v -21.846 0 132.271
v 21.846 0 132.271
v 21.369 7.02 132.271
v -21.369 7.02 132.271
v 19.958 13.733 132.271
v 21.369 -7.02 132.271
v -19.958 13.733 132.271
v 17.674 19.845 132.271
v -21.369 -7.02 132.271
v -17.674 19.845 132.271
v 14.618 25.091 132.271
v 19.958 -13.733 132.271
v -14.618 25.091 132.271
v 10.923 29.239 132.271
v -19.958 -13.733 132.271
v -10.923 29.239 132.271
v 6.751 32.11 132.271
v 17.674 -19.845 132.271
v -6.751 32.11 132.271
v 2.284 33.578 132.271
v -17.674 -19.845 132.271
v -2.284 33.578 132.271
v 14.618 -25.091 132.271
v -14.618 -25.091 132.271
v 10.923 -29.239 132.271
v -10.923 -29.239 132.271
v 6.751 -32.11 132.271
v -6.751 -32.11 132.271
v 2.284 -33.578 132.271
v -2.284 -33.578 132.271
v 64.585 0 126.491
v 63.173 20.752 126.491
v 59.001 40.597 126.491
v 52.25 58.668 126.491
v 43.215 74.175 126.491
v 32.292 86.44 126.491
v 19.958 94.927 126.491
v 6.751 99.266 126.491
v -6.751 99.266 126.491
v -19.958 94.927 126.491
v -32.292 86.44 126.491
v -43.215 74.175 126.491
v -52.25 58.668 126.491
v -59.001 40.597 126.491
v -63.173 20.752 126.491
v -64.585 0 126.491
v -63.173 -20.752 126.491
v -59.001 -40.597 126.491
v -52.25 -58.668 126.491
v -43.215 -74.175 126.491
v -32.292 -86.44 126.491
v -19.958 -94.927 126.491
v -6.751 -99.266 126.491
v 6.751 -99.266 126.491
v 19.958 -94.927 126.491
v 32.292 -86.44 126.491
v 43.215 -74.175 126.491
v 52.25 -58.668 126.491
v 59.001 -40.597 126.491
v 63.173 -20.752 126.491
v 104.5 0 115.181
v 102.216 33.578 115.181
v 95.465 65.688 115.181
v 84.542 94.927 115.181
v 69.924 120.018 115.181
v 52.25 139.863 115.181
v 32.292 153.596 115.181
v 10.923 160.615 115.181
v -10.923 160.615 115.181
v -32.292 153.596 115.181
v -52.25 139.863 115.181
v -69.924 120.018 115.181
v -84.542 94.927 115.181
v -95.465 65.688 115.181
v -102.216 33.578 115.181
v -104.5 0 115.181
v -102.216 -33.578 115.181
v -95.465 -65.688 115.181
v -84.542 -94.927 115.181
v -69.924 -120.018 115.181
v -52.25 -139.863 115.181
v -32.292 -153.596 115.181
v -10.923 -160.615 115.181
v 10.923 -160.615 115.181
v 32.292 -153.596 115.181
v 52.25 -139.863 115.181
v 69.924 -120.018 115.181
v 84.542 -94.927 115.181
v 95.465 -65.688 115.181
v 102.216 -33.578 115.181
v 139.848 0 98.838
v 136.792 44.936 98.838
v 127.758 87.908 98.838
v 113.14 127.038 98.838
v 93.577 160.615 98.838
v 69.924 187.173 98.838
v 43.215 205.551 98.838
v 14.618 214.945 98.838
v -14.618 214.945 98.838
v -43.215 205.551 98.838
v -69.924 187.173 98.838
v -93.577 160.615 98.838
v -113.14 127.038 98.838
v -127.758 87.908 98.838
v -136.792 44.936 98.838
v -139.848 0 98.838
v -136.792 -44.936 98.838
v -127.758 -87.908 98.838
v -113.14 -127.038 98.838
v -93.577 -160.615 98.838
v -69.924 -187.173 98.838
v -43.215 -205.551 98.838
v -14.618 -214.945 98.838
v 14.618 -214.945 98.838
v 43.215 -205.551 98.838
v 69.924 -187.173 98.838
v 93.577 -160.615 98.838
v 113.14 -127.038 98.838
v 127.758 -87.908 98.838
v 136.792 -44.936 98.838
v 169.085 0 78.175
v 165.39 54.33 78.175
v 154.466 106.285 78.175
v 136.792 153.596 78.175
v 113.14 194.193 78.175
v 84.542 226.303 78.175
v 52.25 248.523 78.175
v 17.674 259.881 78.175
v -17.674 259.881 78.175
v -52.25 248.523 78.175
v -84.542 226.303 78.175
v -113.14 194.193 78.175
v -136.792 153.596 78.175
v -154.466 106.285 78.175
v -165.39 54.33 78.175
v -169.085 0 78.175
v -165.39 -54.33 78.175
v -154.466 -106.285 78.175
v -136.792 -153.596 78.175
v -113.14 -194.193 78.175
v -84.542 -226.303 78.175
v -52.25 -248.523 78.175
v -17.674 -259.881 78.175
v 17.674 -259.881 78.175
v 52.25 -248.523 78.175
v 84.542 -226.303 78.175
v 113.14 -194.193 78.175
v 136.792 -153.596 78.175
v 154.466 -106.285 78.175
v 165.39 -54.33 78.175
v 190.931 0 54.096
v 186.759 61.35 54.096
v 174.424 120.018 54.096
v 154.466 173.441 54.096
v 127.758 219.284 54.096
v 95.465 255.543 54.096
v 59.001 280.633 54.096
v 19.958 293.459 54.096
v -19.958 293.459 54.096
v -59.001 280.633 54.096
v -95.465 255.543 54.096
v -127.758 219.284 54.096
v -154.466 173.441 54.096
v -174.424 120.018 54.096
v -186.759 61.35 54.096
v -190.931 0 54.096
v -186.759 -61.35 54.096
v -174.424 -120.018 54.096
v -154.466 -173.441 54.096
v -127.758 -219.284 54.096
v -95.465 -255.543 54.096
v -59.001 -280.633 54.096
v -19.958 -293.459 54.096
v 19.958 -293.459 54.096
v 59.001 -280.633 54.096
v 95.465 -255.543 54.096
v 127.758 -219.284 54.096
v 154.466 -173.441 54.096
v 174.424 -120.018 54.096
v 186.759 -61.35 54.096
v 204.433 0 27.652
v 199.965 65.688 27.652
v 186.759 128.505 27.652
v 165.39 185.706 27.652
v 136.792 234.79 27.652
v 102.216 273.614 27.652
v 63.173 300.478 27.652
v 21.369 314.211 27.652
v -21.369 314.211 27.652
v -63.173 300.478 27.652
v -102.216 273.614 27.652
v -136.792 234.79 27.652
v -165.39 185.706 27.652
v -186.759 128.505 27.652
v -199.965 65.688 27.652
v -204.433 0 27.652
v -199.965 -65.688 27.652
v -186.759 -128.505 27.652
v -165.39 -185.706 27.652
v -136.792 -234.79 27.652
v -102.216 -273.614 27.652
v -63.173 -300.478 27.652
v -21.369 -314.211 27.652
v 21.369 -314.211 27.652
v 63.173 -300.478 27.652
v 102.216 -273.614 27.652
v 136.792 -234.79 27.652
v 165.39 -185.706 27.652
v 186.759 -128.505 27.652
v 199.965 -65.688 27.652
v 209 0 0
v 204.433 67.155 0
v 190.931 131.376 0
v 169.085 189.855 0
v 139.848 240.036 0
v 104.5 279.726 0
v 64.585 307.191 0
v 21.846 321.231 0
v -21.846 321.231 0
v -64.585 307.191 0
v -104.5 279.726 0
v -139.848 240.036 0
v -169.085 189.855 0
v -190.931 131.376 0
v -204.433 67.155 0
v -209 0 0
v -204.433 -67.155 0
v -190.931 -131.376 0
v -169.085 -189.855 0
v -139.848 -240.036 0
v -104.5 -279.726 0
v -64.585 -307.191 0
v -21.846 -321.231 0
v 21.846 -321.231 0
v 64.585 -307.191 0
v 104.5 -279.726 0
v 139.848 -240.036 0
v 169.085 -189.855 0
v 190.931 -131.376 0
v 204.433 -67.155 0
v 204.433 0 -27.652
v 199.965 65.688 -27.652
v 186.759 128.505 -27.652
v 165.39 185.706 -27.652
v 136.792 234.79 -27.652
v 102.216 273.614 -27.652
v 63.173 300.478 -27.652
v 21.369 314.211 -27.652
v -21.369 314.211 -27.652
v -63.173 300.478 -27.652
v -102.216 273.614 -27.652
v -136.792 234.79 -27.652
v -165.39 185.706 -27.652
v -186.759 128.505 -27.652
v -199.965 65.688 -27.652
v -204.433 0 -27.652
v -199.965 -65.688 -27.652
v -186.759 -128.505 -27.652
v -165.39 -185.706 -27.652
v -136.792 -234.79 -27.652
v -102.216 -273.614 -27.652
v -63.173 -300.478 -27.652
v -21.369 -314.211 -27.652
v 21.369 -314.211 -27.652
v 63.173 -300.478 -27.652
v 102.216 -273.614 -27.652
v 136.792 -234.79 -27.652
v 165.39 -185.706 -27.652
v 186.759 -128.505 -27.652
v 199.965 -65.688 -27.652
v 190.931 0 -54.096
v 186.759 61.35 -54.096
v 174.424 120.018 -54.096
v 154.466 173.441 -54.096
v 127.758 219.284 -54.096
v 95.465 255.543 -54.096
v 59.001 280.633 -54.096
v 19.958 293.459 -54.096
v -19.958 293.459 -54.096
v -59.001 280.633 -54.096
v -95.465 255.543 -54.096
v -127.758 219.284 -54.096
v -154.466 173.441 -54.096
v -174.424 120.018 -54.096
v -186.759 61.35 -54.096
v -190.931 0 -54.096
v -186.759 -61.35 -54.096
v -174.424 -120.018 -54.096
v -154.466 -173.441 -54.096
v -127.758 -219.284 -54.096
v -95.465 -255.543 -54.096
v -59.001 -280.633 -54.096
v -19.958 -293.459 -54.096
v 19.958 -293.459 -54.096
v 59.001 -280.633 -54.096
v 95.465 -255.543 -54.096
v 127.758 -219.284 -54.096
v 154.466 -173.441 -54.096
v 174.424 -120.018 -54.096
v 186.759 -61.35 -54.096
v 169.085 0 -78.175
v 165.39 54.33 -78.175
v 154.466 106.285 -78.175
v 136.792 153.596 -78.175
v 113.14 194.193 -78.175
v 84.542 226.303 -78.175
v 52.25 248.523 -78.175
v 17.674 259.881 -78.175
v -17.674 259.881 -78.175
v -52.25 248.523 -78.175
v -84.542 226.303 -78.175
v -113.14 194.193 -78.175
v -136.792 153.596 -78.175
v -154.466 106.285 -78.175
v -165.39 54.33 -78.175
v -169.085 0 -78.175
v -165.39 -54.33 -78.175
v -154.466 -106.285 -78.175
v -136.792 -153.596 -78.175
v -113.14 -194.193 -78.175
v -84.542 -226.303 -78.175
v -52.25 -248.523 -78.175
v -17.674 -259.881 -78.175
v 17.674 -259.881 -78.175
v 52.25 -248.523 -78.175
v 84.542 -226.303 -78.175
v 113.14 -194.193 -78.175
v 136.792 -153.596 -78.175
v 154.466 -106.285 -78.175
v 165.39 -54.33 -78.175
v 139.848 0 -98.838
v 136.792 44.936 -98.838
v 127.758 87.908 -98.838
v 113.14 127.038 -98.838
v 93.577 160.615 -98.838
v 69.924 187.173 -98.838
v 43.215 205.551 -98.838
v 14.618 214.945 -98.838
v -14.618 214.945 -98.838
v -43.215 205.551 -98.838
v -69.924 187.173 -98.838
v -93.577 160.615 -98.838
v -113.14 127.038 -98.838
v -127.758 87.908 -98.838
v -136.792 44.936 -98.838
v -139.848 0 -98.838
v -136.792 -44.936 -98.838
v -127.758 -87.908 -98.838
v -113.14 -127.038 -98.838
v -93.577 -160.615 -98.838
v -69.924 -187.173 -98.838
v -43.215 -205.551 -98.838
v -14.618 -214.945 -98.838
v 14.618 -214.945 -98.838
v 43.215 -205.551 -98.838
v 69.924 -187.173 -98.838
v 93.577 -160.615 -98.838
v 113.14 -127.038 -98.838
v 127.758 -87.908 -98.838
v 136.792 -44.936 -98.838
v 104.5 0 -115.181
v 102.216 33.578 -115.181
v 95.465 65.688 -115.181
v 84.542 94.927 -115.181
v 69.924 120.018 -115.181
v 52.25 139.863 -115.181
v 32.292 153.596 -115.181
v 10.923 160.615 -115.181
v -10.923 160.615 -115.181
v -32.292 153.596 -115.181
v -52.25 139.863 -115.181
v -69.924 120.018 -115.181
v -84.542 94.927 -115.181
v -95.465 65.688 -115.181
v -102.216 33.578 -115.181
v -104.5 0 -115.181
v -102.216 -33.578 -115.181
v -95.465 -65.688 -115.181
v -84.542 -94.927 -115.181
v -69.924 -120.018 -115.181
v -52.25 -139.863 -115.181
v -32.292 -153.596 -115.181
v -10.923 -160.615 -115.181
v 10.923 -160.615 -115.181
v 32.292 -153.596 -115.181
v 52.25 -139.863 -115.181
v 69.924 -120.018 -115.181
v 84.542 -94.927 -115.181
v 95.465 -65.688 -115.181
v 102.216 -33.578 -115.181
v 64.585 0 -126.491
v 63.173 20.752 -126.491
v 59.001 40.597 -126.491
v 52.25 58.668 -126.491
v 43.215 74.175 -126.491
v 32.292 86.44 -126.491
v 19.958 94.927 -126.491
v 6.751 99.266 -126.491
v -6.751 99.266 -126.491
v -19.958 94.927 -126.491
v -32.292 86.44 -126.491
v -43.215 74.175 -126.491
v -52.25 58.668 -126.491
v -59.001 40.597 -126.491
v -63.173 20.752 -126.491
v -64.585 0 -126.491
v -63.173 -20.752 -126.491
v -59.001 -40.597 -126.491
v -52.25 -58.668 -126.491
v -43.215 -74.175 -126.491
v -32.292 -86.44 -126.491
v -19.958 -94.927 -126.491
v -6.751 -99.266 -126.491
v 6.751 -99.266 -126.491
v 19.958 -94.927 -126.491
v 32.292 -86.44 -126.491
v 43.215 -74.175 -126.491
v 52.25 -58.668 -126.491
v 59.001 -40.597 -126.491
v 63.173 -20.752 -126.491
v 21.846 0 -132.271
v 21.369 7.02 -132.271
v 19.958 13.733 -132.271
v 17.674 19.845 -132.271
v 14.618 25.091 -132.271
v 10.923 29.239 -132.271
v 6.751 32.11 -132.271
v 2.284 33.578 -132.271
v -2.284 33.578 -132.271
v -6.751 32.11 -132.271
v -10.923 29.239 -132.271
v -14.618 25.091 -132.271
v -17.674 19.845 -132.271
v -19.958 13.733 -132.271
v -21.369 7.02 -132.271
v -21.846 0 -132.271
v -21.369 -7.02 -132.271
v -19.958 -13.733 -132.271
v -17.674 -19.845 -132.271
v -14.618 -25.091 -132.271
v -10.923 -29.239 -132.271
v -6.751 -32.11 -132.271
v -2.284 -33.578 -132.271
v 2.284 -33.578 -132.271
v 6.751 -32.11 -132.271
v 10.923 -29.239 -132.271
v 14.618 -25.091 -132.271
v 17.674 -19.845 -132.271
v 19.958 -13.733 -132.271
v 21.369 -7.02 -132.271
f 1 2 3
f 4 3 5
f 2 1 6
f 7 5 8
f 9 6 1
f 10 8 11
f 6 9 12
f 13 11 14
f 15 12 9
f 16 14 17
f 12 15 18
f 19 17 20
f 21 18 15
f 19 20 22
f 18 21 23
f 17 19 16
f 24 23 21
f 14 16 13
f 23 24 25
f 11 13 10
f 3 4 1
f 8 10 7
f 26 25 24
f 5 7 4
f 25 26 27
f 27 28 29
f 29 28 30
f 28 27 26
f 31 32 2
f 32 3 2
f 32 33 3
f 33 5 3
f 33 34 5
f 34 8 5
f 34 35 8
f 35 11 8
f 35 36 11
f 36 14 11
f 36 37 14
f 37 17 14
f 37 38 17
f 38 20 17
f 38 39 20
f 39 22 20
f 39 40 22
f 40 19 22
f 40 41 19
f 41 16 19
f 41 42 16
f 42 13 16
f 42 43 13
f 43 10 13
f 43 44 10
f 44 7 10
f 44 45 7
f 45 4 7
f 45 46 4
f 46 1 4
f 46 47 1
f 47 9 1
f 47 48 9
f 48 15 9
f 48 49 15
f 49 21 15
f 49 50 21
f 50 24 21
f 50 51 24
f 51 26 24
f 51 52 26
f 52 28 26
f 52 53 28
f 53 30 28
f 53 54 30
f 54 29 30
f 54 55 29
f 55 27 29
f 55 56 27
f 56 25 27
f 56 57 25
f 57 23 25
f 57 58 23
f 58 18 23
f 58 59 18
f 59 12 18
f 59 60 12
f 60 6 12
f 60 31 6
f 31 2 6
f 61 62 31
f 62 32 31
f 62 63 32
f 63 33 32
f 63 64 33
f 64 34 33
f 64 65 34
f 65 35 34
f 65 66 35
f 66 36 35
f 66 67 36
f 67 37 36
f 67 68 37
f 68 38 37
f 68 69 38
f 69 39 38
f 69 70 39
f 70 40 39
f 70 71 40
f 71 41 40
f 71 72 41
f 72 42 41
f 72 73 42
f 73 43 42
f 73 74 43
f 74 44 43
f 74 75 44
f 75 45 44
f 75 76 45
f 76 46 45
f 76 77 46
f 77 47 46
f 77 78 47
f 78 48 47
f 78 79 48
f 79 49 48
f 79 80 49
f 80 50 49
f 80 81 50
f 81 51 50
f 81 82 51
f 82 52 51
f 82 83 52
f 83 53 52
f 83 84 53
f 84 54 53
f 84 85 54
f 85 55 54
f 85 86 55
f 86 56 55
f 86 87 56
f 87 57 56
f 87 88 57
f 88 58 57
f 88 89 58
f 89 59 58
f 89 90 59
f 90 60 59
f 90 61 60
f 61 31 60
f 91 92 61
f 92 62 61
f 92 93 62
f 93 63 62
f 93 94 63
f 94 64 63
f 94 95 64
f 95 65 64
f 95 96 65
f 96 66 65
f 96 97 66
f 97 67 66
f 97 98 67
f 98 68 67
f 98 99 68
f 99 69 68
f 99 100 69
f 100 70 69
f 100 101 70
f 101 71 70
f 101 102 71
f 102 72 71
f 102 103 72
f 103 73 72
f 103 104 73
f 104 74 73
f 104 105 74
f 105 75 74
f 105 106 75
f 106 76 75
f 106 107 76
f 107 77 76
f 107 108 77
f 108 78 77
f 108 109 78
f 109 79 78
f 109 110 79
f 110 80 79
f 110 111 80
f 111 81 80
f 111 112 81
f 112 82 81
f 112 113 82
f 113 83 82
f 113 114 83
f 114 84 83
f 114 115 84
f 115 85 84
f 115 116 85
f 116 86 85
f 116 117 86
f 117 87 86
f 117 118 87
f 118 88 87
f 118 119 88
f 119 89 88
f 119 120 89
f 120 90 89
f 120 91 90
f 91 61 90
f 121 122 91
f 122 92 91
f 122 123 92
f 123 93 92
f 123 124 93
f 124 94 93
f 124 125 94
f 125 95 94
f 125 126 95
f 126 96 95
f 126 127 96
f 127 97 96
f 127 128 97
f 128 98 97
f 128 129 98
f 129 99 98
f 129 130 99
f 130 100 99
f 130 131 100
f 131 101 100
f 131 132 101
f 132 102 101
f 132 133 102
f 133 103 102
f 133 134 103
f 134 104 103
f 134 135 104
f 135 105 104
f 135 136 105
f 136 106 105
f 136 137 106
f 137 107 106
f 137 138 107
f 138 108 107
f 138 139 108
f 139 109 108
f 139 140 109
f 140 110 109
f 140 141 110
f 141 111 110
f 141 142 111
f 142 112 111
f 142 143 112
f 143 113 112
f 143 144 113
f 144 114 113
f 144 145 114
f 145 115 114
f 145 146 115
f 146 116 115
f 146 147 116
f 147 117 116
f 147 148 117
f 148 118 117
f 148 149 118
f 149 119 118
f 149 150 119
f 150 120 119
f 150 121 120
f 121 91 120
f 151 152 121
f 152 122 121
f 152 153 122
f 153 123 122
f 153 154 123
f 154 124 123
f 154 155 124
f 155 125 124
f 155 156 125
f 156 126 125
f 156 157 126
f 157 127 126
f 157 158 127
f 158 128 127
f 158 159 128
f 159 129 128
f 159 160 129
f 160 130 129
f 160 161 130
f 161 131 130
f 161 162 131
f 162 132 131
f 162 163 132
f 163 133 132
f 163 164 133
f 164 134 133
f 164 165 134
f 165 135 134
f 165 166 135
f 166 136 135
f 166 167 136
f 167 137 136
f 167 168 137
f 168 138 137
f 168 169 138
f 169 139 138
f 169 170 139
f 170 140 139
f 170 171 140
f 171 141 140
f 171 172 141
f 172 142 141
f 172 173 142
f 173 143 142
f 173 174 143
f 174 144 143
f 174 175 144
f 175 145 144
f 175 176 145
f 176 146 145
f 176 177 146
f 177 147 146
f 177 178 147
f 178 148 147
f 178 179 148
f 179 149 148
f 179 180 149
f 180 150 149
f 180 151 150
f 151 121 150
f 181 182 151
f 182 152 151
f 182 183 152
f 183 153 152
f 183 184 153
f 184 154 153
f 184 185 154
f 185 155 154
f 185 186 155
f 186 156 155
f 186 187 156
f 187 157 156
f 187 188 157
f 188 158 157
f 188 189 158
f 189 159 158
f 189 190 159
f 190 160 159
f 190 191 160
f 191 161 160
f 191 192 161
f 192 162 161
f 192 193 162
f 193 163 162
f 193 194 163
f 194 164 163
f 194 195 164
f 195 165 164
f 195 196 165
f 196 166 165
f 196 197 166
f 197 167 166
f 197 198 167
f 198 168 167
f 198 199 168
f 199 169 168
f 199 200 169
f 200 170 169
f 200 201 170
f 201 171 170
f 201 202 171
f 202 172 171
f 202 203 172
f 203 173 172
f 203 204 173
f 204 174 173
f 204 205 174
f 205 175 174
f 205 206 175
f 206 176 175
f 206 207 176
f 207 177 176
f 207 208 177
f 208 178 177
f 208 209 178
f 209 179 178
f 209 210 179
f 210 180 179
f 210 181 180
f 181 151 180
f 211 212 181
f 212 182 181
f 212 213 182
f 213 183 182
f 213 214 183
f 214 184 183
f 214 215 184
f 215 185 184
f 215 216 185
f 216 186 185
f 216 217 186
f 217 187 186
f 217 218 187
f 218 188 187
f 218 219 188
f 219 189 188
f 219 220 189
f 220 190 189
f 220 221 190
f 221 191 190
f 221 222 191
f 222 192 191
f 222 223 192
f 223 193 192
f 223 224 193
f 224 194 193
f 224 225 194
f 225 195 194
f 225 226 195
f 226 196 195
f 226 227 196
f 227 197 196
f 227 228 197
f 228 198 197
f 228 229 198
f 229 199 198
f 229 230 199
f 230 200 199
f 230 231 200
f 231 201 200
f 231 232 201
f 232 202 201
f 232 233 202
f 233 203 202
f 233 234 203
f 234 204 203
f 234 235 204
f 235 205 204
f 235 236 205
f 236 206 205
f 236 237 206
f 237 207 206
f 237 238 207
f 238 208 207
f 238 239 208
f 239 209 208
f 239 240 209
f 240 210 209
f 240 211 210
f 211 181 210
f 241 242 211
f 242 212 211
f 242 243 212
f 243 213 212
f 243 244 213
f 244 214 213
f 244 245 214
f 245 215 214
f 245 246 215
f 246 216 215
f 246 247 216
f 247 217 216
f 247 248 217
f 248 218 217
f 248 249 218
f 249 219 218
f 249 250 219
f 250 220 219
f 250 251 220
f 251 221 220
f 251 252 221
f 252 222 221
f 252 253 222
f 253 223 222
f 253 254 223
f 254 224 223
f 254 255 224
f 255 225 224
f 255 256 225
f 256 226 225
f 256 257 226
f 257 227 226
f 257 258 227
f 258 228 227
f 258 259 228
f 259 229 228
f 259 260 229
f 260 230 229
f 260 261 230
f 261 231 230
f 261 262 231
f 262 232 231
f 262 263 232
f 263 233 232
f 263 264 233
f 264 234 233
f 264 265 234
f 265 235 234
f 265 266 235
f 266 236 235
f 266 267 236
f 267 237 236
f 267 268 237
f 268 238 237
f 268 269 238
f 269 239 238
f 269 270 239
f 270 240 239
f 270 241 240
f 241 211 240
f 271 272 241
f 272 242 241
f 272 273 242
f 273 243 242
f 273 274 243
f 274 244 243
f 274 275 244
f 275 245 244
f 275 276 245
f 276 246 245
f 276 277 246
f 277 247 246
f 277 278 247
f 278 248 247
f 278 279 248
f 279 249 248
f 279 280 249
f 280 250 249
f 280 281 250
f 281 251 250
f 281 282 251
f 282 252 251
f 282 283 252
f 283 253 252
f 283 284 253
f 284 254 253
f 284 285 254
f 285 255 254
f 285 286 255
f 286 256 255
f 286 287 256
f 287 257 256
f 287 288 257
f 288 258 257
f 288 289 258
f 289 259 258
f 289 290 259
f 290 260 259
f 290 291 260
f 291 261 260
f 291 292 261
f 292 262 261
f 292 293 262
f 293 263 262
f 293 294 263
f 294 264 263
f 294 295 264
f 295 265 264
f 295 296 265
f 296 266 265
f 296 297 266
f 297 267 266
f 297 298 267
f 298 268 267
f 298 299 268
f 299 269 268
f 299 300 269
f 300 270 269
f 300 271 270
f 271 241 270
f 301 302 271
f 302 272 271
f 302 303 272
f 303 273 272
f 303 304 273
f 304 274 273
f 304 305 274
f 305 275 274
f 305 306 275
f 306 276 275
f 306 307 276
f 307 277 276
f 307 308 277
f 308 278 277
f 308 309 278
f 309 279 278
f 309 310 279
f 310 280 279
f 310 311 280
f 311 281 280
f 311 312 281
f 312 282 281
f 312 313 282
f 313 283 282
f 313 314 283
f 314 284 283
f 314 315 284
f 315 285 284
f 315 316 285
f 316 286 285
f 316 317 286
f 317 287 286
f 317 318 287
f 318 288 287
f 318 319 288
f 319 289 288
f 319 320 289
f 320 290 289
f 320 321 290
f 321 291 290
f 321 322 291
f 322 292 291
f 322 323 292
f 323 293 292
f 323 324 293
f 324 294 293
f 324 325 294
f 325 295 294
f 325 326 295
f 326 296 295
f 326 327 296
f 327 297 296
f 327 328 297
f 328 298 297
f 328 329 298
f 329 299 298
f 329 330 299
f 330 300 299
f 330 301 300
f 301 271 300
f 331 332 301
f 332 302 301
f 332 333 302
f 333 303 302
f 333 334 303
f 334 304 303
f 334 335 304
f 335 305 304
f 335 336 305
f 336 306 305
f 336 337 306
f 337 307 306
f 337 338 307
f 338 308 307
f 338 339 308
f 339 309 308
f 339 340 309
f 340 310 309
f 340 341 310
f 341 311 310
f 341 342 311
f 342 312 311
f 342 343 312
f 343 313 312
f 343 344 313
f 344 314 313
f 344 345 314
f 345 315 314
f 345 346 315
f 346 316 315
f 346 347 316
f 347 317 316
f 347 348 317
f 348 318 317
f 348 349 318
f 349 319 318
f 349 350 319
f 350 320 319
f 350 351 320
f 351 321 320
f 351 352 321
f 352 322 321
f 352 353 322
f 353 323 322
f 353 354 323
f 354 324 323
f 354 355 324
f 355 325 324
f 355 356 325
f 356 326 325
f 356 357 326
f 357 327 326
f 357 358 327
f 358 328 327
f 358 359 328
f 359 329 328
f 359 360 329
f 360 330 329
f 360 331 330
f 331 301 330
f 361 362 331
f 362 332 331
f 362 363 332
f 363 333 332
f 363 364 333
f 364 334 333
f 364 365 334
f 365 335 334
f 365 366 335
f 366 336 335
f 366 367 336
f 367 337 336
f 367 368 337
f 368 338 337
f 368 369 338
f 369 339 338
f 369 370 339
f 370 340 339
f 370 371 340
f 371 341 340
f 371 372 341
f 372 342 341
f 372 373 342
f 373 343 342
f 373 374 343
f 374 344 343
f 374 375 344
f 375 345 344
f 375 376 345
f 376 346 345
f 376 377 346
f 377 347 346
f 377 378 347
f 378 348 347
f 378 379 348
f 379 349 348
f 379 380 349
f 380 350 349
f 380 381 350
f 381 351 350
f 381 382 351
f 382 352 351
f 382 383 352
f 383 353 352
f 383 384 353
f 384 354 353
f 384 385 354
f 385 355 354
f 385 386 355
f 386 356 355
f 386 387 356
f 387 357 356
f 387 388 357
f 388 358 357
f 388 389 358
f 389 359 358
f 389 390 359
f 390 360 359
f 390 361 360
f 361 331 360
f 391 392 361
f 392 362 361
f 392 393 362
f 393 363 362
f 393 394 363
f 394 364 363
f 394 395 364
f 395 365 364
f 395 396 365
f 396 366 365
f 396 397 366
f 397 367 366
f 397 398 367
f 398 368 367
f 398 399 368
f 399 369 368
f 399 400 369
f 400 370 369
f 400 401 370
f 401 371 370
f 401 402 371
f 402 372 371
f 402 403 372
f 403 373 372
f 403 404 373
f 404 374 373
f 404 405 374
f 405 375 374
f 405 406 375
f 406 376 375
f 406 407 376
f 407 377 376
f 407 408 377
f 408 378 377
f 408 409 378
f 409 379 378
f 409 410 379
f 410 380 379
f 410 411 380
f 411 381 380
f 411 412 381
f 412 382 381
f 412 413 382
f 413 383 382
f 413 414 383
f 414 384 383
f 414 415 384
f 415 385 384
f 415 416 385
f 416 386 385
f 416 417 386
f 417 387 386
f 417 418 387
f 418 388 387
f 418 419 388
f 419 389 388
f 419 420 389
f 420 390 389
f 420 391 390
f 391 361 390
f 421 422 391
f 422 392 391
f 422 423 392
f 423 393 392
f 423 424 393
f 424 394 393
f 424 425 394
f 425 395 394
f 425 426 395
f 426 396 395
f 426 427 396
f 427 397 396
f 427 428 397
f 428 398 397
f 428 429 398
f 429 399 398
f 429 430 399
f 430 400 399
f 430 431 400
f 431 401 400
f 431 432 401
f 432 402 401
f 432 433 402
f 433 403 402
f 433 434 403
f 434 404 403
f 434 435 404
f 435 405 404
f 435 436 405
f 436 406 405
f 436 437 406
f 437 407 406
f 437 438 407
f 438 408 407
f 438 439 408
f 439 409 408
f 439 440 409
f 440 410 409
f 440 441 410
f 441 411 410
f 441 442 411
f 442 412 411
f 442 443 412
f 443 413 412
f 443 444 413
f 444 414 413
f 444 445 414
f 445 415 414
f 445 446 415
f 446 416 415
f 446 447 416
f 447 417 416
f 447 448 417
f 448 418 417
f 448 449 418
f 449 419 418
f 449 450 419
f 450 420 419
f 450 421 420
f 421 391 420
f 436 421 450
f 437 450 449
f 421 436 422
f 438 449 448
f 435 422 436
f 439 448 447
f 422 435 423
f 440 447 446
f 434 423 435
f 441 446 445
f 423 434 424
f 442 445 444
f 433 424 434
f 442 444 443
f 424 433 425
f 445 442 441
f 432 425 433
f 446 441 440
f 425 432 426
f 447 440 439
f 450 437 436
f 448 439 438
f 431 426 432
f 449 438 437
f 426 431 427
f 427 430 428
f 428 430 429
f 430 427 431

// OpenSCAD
// Generated by SolidPython 1.0.1 on 2020-07-29 00:46:50


scale(v = [11, 17, 7]) {
	sphere(r = 19);
}
/***********************************************
*********      SolidPython code:      **********
************************************************
 
# import packages: SolidPython
from solid import *
from solid.utils import *
from itertools import chain, combinations, permutations


class Resize:

    def __init__(self, scad_file):
        self.scad_file = scad_file
        #self.scad_file = import_scad(scad_file)
        # cone/cylinder param:
        self.r1 = 0
        self.r2 = 0
        self.h = 0
        # rectangular prism param:
        self.w = 0
        self.l = 0
        # ellipse param:
        self.r = 0

    # import OpenScad code (file name corresponds to shape)


    # classify shape + parameters
    def assign(self, param1, param2, param3):
        if self.scad_file == 'cone.scad':
            self.r1 = param1
            self.r2 = param2
            self.h = param3
        elif self.scad_file == 'cylinder.scad':
            self.r1 = param1
            self.r2 = param2
            self.h = param3
        elif self.scad_file == 'rectangularPrism.scad':
            self.h = param1
            self.l = param2
            self.w = param3
        else:
            self.r = param1
            self.h = param2

    # resize parameters
    def iterate(self):
        x = range(3, 20, 2)
        i = 1
        if self.scad_file == 'cone.scad':
            tempList = list(permutations(x, 2))
            for temp in tempList:
                param1 = temp[0]
                param2 = temp[1]
                filepath = 'produced_scad_files/' + 'cone' + str(param1) + '_' + str(param2) + '_' + '.scad'
                scad_render_to_file(cylinder(h=param1, r1=param2, r2=0), filepath)

        elif self.scad_file == 'cylinder.scad':
            tempList = list(permutations(x, 3))
            for temp in tempList:
                param1 = temp[0]
                param2 = temp[1]
                filepath = 'produced_scad_files/' + 'cylinder' + str(param1) + '_' + str(param2) + '_' + '.scad'
                scad_render_to_file(cylinder(h=param1, r1=param2, r2=param2), filepath)

        elif self.scad_file == 'rectangularPrism.scad':
            tempList = list(permutations(x, 3))
            for temp in tempList:
                param1 = temp[0]
                param2 = temp[1]
                param3 = temp[2]
                filepath = 'produced_scad_files/' + 'rectangularPrism' + str(param1) + '_' + str(param2) + '_' + str(
                    param3) + '.scad'
                scad_render_to_file(cube(size=(param1, param2, param3)), filepath)

        elif self.scad_file == 'ellipse.scad':
            tempList = list(permutations(x, 4))
            for temp in tempList:
                param1 = temp[0]
                param2 = temp[1]
                param3 = temp[2]
                param4 = temp[3]
                filepath = 'produced_scad_files/' + 'ellipse' + str(param1) + '_' + str(param2) + '_' + str(param3) + '_' + str(param4) + '.scad'
                scad_render_to_file(scale([param1, param2, param3])(sphere(r=param4)), filepath)

    def render_to_scadfile(self):
        scad_render_to_file(scad, 'example.scad') 
 
************************************************/
